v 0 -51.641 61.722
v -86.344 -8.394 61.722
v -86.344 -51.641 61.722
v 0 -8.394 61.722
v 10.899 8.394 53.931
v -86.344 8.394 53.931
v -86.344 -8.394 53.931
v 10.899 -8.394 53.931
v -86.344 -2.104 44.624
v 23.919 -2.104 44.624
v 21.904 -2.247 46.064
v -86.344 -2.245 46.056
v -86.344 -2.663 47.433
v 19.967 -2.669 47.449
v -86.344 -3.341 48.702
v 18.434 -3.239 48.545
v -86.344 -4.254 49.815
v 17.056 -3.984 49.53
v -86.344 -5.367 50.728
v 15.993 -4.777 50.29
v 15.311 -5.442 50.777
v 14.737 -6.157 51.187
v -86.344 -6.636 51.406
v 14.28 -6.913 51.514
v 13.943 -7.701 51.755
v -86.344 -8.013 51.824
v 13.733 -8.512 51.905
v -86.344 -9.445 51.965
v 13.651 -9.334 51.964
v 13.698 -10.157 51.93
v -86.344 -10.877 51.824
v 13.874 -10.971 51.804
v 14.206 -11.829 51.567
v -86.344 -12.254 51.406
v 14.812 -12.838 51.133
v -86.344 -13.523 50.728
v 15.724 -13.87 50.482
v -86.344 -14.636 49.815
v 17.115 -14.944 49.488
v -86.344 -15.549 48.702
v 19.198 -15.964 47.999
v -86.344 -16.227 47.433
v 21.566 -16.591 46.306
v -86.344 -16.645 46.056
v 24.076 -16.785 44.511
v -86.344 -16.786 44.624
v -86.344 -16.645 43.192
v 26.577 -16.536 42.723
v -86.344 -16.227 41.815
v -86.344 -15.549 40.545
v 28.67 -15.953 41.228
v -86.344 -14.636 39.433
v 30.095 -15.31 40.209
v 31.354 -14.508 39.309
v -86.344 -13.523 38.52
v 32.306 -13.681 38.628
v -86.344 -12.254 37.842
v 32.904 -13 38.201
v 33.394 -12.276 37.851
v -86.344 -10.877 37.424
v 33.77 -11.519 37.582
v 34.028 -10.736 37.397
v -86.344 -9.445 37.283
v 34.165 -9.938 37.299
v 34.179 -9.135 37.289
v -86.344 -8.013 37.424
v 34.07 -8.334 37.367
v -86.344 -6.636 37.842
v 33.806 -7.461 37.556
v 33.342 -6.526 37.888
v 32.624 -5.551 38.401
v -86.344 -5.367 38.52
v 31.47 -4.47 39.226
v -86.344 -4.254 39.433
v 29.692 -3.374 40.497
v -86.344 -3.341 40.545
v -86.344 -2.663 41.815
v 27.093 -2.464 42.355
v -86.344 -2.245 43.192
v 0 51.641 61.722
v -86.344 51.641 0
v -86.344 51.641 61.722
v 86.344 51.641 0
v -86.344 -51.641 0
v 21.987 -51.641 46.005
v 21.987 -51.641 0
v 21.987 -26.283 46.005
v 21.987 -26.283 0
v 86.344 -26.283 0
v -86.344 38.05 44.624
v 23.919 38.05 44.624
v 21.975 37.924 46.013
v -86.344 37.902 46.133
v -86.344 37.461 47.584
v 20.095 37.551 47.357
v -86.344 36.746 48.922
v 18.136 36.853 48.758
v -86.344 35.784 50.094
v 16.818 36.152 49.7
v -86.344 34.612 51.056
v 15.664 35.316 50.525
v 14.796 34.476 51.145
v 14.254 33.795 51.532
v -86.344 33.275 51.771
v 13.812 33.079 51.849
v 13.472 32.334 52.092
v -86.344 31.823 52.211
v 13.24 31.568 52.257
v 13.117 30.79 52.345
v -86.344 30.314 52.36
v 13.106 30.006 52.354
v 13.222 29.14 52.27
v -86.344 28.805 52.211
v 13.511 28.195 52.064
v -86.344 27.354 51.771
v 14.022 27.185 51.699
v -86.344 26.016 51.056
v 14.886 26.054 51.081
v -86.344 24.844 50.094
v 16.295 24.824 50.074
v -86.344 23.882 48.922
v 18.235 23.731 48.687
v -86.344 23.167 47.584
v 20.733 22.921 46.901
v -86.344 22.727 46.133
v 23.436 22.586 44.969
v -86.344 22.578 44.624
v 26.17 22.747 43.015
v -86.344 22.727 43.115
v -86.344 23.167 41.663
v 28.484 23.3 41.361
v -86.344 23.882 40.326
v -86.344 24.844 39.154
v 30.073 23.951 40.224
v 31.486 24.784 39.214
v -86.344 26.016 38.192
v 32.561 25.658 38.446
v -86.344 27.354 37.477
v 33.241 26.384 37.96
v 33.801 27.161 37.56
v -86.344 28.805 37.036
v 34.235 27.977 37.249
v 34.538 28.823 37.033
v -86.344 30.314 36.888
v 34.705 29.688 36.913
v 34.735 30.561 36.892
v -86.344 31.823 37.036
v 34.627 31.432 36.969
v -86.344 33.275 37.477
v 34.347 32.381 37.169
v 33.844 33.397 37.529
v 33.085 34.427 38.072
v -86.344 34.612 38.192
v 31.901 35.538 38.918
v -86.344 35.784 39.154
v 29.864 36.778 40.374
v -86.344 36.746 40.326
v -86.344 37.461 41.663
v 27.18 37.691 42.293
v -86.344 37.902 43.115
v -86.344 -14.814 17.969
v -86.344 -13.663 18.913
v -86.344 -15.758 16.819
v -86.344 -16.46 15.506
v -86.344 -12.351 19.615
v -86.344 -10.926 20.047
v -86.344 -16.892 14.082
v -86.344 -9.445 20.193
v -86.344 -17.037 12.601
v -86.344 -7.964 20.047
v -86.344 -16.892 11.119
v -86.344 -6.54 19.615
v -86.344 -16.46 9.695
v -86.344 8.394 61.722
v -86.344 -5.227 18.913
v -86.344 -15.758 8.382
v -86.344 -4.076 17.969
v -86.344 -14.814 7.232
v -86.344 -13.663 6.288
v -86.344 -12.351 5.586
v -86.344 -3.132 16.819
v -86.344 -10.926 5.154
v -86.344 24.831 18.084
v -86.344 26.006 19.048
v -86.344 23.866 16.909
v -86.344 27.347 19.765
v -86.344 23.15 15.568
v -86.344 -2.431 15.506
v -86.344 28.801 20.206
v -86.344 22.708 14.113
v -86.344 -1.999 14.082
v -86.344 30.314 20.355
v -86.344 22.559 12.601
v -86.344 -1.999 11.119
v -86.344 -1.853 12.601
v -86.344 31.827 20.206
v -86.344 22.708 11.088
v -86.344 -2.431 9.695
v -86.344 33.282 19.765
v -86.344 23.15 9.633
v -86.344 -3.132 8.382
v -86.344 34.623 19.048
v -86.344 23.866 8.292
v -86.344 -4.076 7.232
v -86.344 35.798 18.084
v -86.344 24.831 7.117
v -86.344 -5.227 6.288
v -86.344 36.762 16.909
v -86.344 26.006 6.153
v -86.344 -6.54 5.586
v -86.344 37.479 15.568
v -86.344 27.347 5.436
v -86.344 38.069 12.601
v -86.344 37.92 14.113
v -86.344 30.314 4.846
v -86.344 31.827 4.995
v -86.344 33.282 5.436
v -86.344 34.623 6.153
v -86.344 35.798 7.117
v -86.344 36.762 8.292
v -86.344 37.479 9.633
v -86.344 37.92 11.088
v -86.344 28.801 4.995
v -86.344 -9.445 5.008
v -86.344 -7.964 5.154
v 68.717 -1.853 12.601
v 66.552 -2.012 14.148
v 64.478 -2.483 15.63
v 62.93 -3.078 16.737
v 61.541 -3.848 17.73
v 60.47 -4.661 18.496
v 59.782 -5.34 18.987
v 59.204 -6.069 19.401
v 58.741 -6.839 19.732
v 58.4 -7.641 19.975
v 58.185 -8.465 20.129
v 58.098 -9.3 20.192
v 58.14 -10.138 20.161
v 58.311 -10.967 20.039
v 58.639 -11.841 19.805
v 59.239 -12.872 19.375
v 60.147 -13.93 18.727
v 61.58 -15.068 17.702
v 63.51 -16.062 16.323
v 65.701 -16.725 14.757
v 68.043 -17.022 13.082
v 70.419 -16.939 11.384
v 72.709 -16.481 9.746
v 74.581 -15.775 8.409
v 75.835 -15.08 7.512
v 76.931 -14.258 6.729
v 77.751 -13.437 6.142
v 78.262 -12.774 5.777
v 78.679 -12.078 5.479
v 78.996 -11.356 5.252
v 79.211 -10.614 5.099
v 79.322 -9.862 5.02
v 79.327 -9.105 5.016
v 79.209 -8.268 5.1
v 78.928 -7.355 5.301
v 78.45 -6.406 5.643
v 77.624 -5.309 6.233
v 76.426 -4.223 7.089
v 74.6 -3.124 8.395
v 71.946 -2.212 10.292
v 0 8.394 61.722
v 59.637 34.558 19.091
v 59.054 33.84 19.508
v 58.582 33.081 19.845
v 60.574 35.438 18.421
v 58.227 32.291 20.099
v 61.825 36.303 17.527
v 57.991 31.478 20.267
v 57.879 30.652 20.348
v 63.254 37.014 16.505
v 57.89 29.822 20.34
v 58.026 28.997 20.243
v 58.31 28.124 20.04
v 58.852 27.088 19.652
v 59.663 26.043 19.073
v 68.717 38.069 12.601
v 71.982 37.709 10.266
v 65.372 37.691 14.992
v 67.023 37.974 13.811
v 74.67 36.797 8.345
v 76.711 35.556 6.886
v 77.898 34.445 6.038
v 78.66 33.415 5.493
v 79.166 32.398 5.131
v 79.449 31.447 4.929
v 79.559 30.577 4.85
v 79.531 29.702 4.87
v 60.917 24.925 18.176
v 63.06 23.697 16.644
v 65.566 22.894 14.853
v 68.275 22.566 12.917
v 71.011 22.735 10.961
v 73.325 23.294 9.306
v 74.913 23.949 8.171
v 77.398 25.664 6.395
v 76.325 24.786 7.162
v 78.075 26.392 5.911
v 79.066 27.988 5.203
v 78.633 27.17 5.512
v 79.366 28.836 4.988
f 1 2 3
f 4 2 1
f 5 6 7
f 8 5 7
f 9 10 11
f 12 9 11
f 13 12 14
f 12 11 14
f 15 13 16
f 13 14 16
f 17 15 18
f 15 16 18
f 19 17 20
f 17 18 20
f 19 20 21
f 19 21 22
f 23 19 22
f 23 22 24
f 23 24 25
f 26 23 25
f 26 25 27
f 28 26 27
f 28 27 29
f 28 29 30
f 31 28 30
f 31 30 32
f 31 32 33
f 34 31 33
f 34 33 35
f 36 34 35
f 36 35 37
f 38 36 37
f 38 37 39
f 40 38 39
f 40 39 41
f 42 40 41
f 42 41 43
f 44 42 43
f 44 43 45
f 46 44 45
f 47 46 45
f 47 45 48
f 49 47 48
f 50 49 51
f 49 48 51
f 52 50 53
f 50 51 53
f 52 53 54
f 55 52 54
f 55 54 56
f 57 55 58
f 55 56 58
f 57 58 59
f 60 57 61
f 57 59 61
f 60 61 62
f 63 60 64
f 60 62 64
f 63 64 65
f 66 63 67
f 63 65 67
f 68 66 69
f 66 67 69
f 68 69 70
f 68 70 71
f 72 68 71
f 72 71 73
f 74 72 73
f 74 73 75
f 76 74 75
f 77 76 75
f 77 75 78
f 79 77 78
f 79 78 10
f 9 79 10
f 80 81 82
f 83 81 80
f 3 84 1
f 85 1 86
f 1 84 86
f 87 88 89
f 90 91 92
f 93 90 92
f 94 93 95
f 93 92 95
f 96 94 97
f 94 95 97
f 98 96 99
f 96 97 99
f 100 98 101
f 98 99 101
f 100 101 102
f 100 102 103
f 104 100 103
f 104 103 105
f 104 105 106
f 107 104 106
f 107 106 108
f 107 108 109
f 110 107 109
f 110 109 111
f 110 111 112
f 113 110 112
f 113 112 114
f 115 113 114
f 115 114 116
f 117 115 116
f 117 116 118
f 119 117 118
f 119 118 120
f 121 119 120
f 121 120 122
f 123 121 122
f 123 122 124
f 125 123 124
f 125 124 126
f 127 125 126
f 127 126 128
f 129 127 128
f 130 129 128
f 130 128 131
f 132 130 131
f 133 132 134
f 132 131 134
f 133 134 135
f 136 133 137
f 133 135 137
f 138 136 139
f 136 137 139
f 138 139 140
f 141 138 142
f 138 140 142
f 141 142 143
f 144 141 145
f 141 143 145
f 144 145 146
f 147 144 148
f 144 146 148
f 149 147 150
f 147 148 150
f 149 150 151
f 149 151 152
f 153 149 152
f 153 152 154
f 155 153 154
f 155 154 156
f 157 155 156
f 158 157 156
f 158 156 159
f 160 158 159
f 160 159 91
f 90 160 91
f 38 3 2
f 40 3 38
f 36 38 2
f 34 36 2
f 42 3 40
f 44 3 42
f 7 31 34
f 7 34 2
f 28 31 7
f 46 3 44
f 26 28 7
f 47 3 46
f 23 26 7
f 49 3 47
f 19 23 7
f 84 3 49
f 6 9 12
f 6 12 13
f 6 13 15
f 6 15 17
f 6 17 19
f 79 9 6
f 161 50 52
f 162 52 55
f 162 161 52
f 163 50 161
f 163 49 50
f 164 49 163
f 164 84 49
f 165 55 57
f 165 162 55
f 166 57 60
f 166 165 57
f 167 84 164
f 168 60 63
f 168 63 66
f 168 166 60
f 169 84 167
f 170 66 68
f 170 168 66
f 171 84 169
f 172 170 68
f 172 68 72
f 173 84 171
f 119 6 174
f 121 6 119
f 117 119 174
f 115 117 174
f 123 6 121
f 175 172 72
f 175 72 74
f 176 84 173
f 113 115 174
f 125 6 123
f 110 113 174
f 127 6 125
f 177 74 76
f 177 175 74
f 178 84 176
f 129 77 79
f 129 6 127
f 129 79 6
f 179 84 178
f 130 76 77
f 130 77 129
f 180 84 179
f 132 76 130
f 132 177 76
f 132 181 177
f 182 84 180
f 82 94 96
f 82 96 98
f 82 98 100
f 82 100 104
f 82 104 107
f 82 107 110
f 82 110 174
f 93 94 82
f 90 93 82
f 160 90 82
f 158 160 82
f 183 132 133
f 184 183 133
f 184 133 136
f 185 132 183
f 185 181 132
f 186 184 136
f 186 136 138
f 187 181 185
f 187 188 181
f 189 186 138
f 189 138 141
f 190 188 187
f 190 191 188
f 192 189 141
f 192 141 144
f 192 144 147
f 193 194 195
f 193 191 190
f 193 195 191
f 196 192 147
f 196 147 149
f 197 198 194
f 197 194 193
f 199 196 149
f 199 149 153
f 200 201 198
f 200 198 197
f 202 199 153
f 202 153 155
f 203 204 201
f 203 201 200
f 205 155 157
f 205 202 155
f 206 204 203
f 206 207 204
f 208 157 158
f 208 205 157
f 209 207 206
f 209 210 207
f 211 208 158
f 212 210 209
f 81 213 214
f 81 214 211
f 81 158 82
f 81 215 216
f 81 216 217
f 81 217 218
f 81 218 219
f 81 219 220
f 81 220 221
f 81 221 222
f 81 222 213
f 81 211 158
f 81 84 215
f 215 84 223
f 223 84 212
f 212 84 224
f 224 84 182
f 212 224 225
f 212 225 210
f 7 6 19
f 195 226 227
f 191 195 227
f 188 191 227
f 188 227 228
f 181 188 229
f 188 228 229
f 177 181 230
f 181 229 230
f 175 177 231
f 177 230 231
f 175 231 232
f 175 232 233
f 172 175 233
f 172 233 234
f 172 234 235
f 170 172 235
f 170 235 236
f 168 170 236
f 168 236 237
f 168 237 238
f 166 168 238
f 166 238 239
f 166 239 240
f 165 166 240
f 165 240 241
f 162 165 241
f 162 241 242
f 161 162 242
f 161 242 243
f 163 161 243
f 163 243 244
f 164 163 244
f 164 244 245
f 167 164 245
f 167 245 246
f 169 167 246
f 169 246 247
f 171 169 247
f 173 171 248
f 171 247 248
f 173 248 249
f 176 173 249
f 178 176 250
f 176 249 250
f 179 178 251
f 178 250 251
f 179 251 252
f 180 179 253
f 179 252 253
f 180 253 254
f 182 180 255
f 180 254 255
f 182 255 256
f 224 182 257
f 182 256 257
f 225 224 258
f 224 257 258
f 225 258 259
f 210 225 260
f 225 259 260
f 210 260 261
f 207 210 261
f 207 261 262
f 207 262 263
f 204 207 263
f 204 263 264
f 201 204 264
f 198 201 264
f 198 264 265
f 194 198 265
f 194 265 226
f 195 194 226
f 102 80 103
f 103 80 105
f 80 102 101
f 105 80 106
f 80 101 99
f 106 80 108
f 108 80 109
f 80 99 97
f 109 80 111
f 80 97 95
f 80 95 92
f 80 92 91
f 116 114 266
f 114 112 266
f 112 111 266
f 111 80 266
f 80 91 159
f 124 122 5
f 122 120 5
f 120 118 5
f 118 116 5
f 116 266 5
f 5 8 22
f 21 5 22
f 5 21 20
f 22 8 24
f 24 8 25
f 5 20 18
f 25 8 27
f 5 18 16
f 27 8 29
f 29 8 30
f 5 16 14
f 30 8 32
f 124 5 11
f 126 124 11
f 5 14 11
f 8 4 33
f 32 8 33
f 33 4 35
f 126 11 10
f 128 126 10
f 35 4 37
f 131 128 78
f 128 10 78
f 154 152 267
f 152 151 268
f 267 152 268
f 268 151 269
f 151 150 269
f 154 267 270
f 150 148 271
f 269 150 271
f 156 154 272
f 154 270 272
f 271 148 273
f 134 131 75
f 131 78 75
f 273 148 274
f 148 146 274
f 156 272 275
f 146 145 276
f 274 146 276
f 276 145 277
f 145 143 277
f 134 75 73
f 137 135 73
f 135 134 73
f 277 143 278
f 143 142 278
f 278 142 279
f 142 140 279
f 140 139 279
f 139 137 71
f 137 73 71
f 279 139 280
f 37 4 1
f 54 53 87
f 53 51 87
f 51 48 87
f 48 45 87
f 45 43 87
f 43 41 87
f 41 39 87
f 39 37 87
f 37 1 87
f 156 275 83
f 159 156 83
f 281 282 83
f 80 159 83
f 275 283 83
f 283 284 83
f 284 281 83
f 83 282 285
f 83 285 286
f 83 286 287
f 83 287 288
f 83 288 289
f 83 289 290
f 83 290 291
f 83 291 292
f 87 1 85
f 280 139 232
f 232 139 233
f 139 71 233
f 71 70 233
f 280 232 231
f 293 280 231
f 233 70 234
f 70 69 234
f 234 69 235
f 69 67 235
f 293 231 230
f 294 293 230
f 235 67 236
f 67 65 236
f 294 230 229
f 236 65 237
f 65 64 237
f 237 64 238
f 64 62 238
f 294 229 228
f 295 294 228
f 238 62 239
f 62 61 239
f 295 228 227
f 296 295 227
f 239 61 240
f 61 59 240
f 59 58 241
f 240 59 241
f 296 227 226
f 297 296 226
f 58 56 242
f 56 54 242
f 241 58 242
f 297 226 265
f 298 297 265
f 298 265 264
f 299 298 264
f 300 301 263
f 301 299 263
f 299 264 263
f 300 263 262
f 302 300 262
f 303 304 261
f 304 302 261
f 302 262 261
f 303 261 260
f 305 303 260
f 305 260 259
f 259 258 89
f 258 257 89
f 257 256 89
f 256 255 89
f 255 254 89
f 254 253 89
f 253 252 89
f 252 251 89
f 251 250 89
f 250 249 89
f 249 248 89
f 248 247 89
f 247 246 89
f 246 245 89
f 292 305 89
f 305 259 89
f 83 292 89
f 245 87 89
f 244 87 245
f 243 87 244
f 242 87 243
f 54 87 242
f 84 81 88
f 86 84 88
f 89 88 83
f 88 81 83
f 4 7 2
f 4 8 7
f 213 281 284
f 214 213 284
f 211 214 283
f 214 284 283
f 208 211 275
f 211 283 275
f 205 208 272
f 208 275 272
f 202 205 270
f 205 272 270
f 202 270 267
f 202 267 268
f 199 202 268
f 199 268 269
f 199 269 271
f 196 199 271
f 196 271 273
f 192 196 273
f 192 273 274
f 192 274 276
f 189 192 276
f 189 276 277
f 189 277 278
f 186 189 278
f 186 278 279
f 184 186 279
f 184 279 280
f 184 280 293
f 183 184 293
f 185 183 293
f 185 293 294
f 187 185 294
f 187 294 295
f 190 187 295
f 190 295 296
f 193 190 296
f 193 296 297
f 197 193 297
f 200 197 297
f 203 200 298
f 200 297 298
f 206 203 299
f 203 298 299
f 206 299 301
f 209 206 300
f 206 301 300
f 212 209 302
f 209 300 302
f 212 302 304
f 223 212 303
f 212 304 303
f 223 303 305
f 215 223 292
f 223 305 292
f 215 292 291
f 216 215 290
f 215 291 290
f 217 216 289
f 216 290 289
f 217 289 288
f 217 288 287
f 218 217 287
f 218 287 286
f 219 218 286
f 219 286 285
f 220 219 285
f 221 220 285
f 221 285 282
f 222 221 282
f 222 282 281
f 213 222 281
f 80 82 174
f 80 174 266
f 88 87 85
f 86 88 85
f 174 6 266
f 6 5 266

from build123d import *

# Parameters (mm, degrees)
F0_W     = 172.6877242327
F0_H     = 103.2821238041
F1_DEPTH = 61.722
F2_R     = 7.7359676361
F2_R_2   = 7.3409655567
F2_R_3   = 7.5923806125
F2_R_4   = 7.7547702854
F3_DEPTH = 324.104
F5_DEPTH = 152.4
F6_W     = 64.3570628017
F6_H     = 25.3581311554
F7_DEPTH = 75.438
F8_W     = 16.7872086167
F8_H     = 7.7908643157
F9_DEPTH = 109.728


with BuildPart() as f1:
    # F0 (on Top) → F1 (new body)
    with BuildSketch(Plane.XY):
        Rectangle(F0_W, F0_H)
    extrude(amount=F1_DEPTH)

    # F2 (on face) → F3 (cut)
    with BuildSketch(Plane.YZ.offset(86.3438621163)):
        with Locations((30.3141865879, 44.6238219738)):
            Circle(F2_R)
        with Locations((-9.4450721517, 44.6238219738)):
            Circle(F2_R_2)
        with Locations((-9.4450721517, 12.600524351)):
            Circle(F2_R_3)
        with Locations((30.3141865879, 12.600524351)):
            Circle(F2_R_4)
    extrude(amount=-F3_DEPTH, mode=Mode.SUBTRACT)

    # F4 (on face) → F5 (cut)
    with BuildSketch(Plane.XZ.offset(51.641061902)):
        Polygon((86.3438621163, 61.722), (0, 61.722), (86.3438621163, 0), align=None)
    extrude(amount=-F5_DEPTH, mode=Mode.SUBTRACT)

    # F6 (on face) → F7 (cut)
    with BuildSketch(Plane(origin=(0, 0, 0), x_dir=(1, 0, 0), z_dir=(0, 0, -1))):
        with Locations((54.1653307155, 38.9619963244)):
            Rectangle(F6_W, F6_H)
    extrude(amount=-F7_DEPTH, mode=Mode.SUBTRACT)

    # F8 (on face) → F9 (cut)
    with BuildSketch(Plane(origin=(-86.3438621163, 0, 0), x_dir=(0, -1, 0), z_dir=(-1, 0, 0))):
        with Locations((0, 57.8265678421)):
            Rectangle(F8_W, F8_H)
    extrude(amount=-F9_DEPTH, mode=Mode.SUBTRACT)


solid = f1.part
